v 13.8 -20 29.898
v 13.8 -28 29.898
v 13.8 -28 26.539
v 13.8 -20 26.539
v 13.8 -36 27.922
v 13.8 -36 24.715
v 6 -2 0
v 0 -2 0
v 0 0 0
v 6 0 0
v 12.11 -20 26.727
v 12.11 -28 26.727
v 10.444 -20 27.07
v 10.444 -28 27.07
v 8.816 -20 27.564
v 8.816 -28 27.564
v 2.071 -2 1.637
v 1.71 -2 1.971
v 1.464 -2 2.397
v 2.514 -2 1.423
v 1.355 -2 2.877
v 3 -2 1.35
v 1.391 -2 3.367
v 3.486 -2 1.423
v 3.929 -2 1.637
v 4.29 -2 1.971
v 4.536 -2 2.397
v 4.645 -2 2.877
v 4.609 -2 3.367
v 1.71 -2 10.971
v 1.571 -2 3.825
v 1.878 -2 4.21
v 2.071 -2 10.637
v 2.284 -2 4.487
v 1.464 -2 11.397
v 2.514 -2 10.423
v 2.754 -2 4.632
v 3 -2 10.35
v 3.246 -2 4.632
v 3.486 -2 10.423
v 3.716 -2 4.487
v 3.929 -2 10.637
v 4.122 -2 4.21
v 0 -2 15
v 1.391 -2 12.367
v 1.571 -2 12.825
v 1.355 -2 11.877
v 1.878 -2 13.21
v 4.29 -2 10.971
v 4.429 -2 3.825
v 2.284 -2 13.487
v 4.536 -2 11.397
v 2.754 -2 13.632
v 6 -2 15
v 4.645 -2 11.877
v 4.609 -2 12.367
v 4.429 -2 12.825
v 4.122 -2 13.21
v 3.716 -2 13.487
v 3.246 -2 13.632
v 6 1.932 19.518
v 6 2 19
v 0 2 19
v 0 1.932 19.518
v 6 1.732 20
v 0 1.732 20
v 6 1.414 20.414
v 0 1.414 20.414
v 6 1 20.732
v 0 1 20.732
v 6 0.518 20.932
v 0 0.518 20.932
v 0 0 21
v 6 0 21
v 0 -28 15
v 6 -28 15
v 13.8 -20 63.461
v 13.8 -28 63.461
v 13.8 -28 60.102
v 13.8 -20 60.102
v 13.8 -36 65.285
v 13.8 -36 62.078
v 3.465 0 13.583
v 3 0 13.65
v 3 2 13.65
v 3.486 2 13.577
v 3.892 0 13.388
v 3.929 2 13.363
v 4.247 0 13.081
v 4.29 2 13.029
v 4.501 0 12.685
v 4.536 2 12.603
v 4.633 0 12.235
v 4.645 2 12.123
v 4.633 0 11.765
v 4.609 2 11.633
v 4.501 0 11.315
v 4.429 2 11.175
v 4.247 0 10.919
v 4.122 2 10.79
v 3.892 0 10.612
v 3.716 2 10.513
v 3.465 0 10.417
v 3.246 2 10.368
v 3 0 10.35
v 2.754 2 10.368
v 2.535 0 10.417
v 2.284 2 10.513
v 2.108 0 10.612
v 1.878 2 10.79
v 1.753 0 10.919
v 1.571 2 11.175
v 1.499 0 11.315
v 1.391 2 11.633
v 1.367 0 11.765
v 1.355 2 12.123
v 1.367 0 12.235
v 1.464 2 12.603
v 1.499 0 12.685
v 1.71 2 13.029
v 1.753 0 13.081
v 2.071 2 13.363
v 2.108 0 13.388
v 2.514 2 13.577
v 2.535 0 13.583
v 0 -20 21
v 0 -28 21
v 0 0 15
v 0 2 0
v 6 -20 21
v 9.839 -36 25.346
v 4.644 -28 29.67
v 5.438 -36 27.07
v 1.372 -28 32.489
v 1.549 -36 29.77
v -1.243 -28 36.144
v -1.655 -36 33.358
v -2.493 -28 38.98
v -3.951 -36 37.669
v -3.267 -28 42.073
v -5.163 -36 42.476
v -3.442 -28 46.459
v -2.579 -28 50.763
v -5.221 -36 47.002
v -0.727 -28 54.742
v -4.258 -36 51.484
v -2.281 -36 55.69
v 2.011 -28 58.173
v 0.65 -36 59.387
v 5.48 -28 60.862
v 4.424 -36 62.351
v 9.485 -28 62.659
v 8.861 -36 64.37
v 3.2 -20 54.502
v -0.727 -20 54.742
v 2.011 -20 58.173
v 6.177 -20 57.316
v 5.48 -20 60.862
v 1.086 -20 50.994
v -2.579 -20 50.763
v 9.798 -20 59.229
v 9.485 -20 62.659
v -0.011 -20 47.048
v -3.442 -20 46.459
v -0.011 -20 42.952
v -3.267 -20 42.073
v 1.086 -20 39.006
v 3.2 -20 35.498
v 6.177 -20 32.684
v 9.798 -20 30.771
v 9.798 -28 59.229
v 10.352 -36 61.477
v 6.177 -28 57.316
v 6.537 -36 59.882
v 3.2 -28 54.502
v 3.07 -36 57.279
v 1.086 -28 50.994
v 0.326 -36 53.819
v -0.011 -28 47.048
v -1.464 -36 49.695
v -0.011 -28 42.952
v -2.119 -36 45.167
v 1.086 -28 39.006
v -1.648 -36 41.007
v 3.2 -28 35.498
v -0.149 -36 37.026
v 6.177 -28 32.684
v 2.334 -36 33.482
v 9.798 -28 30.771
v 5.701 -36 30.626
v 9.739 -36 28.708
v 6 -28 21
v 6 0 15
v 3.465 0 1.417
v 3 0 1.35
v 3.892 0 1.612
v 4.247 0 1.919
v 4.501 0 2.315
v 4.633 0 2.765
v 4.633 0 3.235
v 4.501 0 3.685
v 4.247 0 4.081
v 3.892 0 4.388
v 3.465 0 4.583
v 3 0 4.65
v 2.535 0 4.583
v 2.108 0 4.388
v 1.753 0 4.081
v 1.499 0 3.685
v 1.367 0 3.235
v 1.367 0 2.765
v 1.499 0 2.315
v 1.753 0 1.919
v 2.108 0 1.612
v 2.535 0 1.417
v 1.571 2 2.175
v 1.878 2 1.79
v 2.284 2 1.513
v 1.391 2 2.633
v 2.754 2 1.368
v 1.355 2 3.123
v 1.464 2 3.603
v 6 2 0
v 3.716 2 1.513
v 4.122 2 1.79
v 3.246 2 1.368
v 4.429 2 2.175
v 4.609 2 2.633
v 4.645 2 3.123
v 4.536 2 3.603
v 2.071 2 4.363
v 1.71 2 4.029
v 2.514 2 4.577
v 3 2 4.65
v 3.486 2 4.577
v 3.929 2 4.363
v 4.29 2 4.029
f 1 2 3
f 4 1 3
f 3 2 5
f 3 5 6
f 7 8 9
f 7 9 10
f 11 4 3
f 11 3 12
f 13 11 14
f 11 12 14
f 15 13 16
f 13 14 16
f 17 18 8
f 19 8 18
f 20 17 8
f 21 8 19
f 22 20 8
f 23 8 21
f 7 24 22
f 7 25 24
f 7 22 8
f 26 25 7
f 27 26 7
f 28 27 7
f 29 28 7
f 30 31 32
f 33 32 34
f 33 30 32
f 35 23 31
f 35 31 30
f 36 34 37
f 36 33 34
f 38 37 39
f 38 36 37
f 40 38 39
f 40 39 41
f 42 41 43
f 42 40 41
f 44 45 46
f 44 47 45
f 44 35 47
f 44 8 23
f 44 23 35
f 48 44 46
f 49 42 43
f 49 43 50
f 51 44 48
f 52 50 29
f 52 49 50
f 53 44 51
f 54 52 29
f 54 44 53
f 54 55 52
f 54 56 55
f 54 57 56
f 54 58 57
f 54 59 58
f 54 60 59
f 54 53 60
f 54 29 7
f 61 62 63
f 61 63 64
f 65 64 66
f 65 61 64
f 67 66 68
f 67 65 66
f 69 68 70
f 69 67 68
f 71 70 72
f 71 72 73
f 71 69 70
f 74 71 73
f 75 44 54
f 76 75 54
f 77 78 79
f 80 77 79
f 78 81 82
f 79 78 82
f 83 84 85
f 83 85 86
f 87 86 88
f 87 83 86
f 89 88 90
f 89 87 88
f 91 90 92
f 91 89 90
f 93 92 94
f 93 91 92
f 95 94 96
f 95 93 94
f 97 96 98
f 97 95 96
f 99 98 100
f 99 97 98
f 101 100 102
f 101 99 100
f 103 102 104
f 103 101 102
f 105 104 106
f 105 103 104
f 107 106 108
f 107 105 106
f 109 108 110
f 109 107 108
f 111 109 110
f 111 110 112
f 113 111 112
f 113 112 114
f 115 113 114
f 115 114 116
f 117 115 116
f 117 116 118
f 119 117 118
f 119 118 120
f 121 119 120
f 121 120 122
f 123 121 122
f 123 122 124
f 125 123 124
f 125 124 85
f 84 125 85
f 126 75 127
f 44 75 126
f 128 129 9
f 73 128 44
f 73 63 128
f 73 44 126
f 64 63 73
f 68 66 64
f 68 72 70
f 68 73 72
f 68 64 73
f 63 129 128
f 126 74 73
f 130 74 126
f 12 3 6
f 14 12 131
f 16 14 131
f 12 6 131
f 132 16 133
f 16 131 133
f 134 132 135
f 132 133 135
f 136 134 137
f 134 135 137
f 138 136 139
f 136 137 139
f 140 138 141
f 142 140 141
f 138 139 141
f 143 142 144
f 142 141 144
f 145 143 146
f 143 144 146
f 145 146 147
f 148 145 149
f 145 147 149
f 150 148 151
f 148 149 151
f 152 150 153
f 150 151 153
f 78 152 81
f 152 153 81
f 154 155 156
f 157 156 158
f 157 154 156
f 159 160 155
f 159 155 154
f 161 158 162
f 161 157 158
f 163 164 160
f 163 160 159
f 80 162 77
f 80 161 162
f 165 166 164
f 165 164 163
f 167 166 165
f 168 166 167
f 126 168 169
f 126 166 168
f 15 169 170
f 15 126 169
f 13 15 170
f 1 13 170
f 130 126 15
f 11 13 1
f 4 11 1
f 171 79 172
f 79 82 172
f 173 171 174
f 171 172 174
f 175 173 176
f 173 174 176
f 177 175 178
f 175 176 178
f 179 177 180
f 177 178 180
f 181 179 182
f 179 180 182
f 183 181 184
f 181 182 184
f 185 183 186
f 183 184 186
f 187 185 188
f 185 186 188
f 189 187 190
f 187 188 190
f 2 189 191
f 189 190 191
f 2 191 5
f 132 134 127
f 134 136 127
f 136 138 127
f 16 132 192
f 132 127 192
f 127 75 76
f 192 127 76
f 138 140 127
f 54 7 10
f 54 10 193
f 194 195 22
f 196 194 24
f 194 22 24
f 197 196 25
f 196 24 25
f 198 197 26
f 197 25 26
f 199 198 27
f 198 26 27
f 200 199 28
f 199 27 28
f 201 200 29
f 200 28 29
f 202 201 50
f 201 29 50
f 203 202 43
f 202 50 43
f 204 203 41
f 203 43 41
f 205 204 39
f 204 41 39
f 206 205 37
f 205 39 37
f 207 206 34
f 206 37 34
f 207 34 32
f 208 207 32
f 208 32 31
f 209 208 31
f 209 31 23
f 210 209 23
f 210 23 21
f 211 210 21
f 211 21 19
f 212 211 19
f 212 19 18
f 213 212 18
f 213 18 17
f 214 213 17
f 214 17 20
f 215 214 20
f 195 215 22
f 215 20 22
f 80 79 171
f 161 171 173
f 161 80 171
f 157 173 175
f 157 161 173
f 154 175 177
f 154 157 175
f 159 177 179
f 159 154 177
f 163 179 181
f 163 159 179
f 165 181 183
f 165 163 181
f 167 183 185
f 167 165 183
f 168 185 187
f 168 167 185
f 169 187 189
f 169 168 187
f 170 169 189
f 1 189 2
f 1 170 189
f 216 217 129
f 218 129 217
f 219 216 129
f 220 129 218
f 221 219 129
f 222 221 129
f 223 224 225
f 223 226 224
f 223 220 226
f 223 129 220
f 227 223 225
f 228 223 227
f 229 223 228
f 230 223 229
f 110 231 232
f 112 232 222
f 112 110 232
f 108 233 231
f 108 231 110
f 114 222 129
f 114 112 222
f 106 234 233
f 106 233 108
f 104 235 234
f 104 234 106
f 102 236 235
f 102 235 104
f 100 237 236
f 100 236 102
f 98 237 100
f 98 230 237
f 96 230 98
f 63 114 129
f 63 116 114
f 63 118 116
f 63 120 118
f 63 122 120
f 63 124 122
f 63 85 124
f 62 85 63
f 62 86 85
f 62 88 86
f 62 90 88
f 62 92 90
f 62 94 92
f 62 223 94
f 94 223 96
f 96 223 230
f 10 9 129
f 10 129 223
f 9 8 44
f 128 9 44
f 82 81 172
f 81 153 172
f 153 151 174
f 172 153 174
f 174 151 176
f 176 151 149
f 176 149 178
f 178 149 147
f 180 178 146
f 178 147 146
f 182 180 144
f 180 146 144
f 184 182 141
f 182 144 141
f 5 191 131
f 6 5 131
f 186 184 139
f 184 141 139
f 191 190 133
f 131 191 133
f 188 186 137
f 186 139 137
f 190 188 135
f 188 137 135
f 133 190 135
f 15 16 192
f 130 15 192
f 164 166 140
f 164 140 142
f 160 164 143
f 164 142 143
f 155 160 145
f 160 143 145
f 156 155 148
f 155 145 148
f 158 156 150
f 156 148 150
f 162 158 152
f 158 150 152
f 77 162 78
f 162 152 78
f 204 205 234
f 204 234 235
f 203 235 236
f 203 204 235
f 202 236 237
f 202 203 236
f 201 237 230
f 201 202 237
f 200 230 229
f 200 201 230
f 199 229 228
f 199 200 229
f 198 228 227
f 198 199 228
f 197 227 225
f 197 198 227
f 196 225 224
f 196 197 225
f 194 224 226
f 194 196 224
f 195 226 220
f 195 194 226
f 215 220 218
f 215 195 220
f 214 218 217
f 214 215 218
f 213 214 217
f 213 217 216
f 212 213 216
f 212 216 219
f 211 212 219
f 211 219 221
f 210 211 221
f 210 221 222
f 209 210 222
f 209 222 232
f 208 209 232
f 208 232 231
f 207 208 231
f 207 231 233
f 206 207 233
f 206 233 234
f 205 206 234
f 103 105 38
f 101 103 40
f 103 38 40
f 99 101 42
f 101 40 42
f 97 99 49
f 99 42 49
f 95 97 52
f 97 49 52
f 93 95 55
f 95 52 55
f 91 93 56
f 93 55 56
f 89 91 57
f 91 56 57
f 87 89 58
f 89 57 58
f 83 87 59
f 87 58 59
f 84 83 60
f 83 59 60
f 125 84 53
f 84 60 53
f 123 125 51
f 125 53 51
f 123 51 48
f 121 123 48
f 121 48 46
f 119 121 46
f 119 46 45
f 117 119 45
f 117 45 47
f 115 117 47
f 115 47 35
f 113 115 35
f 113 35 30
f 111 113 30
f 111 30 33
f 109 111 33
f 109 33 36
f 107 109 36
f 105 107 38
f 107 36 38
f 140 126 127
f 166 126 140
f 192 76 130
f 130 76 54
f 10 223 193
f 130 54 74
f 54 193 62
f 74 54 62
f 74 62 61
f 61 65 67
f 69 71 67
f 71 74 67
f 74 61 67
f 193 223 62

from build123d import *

# Parameters (mm, degrees)
SKETCH_1_W          = 6
SKETCH_1_H          = 15
SKETCH_1_R          = 1.65
EXTRUDE_1_DEPTH     = 2
EXTRUDE_2_DEPTH     = 6
SKETCH_3_W          = 6
SKETCH_3_H          = 30
EXTRUDE_3_DEPTH     = 8
EXTRUDE_4_DEPTH     = 8
CUT_EXTRUDE_1_REACH = 70.569
EXTRUDE_5_DEPTH     = 8
EXTRUDE_START       = 2
SKETCH_11_W         = 6
SKETCH_11_H         = 15
SKETCH_11_R         = 1.65
EXTRUDE_6_DEPTH     = 2


with BuildPart() as part:
    # 草图1 → 凸台-拉伸1 (new body)
    with BuildSketch(Plane(origin=(0, 0, 0), x_dir=(1, 0, 0), z_dir=(0, 1, 0))):
        with Locations((3, -7.5)):
            Rectangle(SKETCH_1_W, SKETCH_1_H)
        with Locations((3, -3)):
            Circle(SKETCH_1_R, mode=Mode.SUBTRACT)
        with Locations((3, -12)):
            Circle(SKETCH_1_R, mode=Mode.SUBTRACT)
    extrude(amount=EXTRUDE_1_DEPTH)

    # 草图2 → 凸台-拉伸2 (add)
    with BuildSketch(Plane(origin=(6, 0, 0), x_dir=(0, 0, -1), z_dir=(1, 0, 0))):
        with BuildLine():
            Line((-15, 2), (-19, 2))
            ThreePointArc((-19, 2), (-20.414213562, 1.414213562), (-21, 0))
            Line((-21, 0), (-21, -20))
            Line((-21, -20), (-15, -20))
            Line((-15, -20), (-15, 2))
        make_face()
    extrude(amount=-EXTRUDE_2_DEPTH)

    # 草图3 → 凸台-拉伸3 (add)
    with BuildSketch(Plane.XZ.offset(20)):
        with Locations((3, 30)):
            Rectangle(SKETCH_3_W, SKETCH_3_H)
    extrude(amount=EXTRUDE_3_DEPTH)

    # 草图5 → 凸台-拉伸4 (add)
    with BuildSketch(Plane(origin=(0, -20, 0), x_dir=(1, 0, 0), z_dir=(0, 1, 0))):
        with BuildLine():
            Line((13.8, -63.461040057), (13.8, -26.538959943))
            ThreePointArc((13.8, -26.538959943), (11.272674372, -26.879375186), (8.816173457, -27.564109163))
            Line((8.816173457, -27.564109163), (6, -21))
            Line((6, -21), (6, -28.836770125))
            ThreePointArc((6, -28.836770125), (-3.04771501, -49.065708168), (13.8, -63.461040057))
        make_face()
    extrude(amount=-EXTRUDE_4_DEPTH)

    # 草图7 → 切除-拉伸1 (cut, up to next)
    with BuildSketch(Plane(origin=(0, -20, 0), x_dir=(1, 0, 0), z_dir=(0, 1, 0)), mode=Mode.PRIVATE) as cut_extrude_1_sk1:
        with BuildLine():
            Line((13.8, -29.897599529), (13.8, -60.102400471))
            ThreePointArc((13.8, -60.102400471), (-0.15, -45), (13.8, -29.897599529))
        make_face()
    cut_extrude_1_tool1 = extrude(cut_extrude_1_sk1.sketch, amount=-CUT_EXTRUDE_1_REACH, mode=Mode.PRIVATE) & part.part
    add(cut_extrude_1_tool1.solids().sort_by_distance((7.916976, -20, 45))[0], mode=Mode.SUBTRACT)

    # 草图8 → 凸台-拉伸5 (add)
    with BuildSketch(Plane(origin=(0, -20, 0), x_dir=(1, 0, 0), z_dir=(0, 1, 0))):
        Polygon((0, -21), (-3.295697184, -42.258200487), (2.143402069, -32.702141854), align=None)
    extrude(amount=-EXTRUDE_5_DEPTH)

    # 草图10 for 放样1 → 放样1 section 0
    with BuildSketch(Plane.XZ.offset(28)):
        with BuildLine():
            Line((13.8, 63.461040057), (13.8, 60.102400471))
            # circular arc as an exact rational Bezier (weights 1, cos(half-angle), 1)
            Bezier((13.8, 60.102400471), (-176.26875, 45), (13.8, 29.897599529), weights=[1, 0.079207921, 1])
            Line((13.8, 29.897599529), (13.8, 26.538959943))
            Bezier((13.8, 26.538959943), (-270.208333333, 45), (13.8, 63.461040057), weights=[1, 0.064864865, 1])
        make_face()
    # 草图9 for 放样1 → 放样1 section 1
    with BuildSketch(Plane(origin=(0, -36, 0), x_dir=(-1, 0, 0), z_dir=(0, -1, 0))):
        with BuildLine():
            Line((-13.8, -24.715464018), (-13.8, -27.922107858))
            Bezier((-13.8, -27.922107858), (229.245333333, -45), (-13.8, -62.077892142), weights=[1, 0.070093458, 1])
            Line((-13.8, -62.077892142), (-13.8, -65.284535982))
            Bezier((-13.8, -65.284535982), (329.085333333, -45), (-13.8, -24.715464018), weights=[1, 0.059055118, 1])
        make_face()
    loft()

    # 草图11 → 凸台-拉伸6 (add)
    with BuildSketch(Plane.XZ.offset(EXTRUDE_START)):
        with Locations((3, 7.5)):
            Rectangle(SKETCH_11_W, SKETCH_11_H)
        with Locations((3, 12)):
            Circle(SKETCH_11_R, mode=Mode.SUBTRACT)
        with Locations((3, 3)):
            Circle(SKETCH_11_R, mode=Mode.SUBTRACT)
    extrude(amount=-EXTRUDE_6_DEPTH)


solid = part.part
